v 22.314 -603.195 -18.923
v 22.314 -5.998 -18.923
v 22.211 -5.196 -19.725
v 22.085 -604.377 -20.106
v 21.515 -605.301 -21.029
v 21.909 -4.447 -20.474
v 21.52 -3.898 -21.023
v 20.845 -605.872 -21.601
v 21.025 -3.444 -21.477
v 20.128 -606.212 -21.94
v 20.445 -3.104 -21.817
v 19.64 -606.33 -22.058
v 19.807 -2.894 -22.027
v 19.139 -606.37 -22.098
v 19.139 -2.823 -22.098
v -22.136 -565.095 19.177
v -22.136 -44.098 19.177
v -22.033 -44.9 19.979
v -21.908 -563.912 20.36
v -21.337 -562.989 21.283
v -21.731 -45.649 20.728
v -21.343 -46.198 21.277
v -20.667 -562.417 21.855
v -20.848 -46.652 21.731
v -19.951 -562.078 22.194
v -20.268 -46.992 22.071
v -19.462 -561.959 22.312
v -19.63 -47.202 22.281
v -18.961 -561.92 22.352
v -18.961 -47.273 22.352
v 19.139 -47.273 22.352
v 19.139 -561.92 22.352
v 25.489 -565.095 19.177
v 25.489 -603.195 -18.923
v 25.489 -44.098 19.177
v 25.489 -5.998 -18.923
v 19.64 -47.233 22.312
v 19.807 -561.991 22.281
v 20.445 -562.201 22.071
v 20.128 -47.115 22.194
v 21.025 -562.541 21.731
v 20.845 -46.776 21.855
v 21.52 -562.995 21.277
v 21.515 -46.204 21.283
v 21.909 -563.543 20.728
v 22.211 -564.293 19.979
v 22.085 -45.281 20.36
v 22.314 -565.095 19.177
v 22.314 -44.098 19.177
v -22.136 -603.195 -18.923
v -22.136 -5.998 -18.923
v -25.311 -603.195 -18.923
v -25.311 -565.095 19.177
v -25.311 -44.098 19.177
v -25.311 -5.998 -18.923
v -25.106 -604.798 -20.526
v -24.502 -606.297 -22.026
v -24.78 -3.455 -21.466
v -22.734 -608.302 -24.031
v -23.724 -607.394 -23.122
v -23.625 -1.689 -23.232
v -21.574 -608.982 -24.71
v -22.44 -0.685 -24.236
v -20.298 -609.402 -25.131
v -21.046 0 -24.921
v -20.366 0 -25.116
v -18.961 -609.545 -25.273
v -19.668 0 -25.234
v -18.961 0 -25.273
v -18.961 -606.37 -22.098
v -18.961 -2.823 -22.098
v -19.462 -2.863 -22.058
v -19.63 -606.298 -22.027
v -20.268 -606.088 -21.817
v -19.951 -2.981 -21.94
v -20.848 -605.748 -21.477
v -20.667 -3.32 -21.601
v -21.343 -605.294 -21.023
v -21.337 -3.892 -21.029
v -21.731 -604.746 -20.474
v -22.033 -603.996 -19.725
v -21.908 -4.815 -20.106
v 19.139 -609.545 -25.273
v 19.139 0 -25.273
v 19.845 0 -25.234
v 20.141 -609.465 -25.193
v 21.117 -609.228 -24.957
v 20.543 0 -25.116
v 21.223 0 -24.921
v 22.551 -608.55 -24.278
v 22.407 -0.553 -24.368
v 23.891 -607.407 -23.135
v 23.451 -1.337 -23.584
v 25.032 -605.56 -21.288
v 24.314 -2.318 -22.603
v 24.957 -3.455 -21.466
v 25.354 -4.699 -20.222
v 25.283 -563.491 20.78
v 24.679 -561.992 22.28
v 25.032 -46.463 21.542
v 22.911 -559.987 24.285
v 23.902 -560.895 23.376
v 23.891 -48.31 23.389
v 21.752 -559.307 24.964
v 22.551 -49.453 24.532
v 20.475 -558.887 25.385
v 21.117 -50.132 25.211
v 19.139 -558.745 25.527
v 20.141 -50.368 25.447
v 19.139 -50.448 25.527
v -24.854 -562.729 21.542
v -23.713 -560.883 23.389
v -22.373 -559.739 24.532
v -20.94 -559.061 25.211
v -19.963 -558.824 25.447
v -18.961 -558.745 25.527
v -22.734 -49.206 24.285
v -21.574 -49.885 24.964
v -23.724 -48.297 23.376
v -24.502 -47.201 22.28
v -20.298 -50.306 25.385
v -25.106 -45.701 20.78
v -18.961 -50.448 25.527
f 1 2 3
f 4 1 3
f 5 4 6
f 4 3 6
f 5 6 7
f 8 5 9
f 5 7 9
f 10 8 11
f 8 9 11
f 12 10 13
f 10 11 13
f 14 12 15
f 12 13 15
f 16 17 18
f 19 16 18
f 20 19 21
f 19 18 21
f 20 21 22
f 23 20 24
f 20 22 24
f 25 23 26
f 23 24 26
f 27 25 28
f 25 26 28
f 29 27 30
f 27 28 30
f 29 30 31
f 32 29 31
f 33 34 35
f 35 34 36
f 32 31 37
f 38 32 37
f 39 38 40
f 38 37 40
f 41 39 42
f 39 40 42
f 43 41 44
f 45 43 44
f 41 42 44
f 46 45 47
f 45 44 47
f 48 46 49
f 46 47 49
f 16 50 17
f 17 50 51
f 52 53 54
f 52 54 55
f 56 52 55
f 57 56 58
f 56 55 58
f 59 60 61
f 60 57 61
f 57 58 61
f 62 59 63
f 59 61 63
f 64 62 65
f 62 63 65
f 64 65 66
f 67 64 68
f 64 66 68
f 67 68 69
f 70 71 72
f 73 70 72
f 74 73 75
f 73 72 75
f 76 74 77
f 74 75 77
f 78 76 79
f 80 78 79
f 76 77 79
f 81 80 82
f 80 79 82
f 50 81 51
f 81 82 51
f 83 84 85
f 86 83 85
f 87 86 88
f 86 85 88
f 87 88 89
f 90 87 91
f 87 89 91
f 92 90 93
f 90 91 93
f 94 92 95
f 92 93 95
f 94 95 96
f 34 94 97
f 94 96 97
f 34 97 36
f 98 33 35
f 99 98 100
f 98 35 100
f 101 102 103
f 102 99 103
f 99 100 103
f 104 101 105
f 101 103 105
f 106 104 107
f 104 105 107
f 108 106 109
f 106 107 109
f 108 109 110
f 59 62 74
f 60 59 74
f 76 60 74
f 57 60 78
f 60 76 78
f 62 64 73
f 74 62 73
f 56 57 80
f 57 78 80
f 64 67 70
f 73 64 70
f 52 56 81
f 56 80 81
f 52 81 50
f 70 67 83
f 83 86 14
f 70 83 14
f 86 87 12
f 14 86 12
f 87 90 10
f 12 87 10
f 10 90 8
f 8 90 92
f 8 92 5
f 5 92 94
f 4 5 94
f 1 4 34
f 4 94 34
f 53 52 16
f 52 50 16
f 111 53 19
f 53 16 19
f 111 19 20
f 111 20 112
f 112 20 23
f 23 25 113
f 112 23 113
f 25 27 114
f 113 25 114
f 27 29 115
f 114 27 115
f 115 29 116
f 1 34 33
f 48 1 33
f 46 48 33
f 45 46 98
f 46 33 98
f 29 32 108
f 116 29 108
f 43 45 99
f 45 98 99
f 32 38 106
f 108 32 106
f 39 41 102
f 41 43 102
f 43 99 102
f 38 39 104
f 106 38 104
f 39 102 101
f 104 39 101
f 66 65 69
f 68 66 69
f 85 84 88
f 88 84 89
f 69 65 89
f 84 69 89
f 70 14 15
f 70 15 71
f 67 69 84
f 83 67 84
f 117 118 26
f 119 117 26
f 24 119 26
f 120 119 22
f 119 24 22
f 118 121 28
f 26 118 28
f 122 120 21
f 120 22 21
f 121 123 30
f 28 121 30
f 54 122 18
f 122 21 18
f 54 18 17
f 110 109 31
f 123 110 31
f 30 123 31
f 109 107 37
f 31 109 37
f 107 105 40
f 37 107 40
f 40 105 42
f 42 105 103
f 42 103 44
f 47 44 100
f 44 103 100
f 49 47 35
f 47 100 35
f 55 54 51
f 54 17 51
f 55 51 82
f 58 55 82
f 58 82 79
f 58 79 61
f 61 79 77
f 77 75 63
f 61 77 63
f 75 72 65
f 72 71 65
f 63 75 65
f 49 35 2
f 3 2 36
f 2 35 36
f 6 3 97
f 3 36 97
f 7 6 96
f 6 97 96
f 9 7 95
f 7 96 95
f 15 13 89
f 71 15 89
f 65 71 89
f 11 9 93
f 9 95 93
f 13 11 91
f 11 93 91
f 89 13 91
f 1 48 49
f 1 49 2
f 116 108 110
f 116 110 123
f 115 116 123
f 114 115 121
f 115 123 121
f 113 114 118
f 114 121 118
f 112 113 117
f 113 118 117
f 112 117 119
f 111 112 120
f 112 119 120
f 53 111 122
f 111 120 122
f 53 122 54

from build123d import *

# Parameters (mm, degrees)
F1_DEPTH = 609.6
F3_DEPTH = 50.801


with BuildPart() as f1:
    # F0 (on Front) → F1 (new body)
    with BuildSketch(Plane.XZ):
        with BuildLine():
            Line((-18.9612670034, -25.2729933709), (19.1387329966, -25.2729933709))
            ThreePointArc((19.1387329966, -25.2729933709), (23.6288610571, -23.4131214314), (25.4887329966, -18.9229933709))
            Line((25.4887329966, -18.9229933709), (25.4887329966, 19.1770066291))
            ThreePointArc((25.4887329966, 19.1770066291), (23.6288610571, 23.6671346896), (19.1387329966, 25.5270066291))
            Line((19.1387329966, 25.5270066291), (-18.9612670034, 25.5270066291))
            ThreePointArc((-18.9612670034, 25.5270066291), (-23.451395064, 23.6671346896), (-25.3112670034, 19.1770066291))
            Line((-25.3112670034, 19.1770066291), (-25.3112670034, -18.9229933709))
            ThreePointArc((-25.3112670034, -18.9229933709), (-23.451395064, -23.4131214314), (-18.9612670034, -25.2729933709))
        make_face()
        with BuildLine():
            Line((-18.9612670034, 22.3520066291), (19.1387329966, 22.3520066291))
            ThreePointArc((19.1387329966, 22.3520066291), (21.3837970268, 21.4220706594), (22.3137329966, 19.1770066291))
            Line((22.3137329966, 19.1770066291), (22.3137329966, -18.9229933709))
            ThreePointArc((22.3137329966, -18.9229933709), (21.3837970268, -21.1680574012), (19.1387329966, -22.0979933709))
            Line((19.1387329966, -22.0979933709), (-18.9612670034, -22.0979933709))
            ThreePointArc((-18.9612670034, -22.0979933709), (-21.2063310337, -21.1680574012), (-22.1362670034, -18.9229933709))
            Line((-22.1362670034, -18.9229933709), (-22.1362670034, 19.1770066291))
            ThreePointArc((-22.1362670034, 19.1770066291), (-21.2063310337, 21.4220706594), (-18.9612670034, 22.3520066291))
        make_face(mode=Mode.SUBTRACT)
    extrude(amount=F1_DEPTH)

    # F2 (on face) → F3 (cut, through all)
    with BuildSketch(Plane.YZ.offset(25.4887329966)):
        Polygon((-637.5276456785, 54.5883400366), (-637.5276456785, -53.2560676181), (-603.1945714313, -18.9229933709), (-609.6, -18.9229933709), (-609.6, 19.1770066291), (-565.0945714313, 19.1770066291), (-529.6832380238, 54.5883400366), align=None)
        Polygon((-609.6, -18.9229933709), (-603.1945714313, -18.9229933709), (-565.0945714313, 19.1770066291), (-609.6, 19.1770066291), align=None)
        Polygon((0, -18.9229933709), (-5.9980263665, -18.9229933709), (48.8678000444, -73.7888197817), (48.8678000444, 69.9899916479), (-94.9110113853, 69.9899916479), (-44.0980263665, 19.1770066291), (0, 19.1770066291), align=None)
        Polygon((-44.0980263665, 19.1770066291), (-5.9980263665, -18.9229933709), (0, -18.9229933709), (0, 19.1770066291), align=None)
    extrude(amount=-F3_DEPTH, mode=Mode.SUBTRACT)


solid = f1.part
